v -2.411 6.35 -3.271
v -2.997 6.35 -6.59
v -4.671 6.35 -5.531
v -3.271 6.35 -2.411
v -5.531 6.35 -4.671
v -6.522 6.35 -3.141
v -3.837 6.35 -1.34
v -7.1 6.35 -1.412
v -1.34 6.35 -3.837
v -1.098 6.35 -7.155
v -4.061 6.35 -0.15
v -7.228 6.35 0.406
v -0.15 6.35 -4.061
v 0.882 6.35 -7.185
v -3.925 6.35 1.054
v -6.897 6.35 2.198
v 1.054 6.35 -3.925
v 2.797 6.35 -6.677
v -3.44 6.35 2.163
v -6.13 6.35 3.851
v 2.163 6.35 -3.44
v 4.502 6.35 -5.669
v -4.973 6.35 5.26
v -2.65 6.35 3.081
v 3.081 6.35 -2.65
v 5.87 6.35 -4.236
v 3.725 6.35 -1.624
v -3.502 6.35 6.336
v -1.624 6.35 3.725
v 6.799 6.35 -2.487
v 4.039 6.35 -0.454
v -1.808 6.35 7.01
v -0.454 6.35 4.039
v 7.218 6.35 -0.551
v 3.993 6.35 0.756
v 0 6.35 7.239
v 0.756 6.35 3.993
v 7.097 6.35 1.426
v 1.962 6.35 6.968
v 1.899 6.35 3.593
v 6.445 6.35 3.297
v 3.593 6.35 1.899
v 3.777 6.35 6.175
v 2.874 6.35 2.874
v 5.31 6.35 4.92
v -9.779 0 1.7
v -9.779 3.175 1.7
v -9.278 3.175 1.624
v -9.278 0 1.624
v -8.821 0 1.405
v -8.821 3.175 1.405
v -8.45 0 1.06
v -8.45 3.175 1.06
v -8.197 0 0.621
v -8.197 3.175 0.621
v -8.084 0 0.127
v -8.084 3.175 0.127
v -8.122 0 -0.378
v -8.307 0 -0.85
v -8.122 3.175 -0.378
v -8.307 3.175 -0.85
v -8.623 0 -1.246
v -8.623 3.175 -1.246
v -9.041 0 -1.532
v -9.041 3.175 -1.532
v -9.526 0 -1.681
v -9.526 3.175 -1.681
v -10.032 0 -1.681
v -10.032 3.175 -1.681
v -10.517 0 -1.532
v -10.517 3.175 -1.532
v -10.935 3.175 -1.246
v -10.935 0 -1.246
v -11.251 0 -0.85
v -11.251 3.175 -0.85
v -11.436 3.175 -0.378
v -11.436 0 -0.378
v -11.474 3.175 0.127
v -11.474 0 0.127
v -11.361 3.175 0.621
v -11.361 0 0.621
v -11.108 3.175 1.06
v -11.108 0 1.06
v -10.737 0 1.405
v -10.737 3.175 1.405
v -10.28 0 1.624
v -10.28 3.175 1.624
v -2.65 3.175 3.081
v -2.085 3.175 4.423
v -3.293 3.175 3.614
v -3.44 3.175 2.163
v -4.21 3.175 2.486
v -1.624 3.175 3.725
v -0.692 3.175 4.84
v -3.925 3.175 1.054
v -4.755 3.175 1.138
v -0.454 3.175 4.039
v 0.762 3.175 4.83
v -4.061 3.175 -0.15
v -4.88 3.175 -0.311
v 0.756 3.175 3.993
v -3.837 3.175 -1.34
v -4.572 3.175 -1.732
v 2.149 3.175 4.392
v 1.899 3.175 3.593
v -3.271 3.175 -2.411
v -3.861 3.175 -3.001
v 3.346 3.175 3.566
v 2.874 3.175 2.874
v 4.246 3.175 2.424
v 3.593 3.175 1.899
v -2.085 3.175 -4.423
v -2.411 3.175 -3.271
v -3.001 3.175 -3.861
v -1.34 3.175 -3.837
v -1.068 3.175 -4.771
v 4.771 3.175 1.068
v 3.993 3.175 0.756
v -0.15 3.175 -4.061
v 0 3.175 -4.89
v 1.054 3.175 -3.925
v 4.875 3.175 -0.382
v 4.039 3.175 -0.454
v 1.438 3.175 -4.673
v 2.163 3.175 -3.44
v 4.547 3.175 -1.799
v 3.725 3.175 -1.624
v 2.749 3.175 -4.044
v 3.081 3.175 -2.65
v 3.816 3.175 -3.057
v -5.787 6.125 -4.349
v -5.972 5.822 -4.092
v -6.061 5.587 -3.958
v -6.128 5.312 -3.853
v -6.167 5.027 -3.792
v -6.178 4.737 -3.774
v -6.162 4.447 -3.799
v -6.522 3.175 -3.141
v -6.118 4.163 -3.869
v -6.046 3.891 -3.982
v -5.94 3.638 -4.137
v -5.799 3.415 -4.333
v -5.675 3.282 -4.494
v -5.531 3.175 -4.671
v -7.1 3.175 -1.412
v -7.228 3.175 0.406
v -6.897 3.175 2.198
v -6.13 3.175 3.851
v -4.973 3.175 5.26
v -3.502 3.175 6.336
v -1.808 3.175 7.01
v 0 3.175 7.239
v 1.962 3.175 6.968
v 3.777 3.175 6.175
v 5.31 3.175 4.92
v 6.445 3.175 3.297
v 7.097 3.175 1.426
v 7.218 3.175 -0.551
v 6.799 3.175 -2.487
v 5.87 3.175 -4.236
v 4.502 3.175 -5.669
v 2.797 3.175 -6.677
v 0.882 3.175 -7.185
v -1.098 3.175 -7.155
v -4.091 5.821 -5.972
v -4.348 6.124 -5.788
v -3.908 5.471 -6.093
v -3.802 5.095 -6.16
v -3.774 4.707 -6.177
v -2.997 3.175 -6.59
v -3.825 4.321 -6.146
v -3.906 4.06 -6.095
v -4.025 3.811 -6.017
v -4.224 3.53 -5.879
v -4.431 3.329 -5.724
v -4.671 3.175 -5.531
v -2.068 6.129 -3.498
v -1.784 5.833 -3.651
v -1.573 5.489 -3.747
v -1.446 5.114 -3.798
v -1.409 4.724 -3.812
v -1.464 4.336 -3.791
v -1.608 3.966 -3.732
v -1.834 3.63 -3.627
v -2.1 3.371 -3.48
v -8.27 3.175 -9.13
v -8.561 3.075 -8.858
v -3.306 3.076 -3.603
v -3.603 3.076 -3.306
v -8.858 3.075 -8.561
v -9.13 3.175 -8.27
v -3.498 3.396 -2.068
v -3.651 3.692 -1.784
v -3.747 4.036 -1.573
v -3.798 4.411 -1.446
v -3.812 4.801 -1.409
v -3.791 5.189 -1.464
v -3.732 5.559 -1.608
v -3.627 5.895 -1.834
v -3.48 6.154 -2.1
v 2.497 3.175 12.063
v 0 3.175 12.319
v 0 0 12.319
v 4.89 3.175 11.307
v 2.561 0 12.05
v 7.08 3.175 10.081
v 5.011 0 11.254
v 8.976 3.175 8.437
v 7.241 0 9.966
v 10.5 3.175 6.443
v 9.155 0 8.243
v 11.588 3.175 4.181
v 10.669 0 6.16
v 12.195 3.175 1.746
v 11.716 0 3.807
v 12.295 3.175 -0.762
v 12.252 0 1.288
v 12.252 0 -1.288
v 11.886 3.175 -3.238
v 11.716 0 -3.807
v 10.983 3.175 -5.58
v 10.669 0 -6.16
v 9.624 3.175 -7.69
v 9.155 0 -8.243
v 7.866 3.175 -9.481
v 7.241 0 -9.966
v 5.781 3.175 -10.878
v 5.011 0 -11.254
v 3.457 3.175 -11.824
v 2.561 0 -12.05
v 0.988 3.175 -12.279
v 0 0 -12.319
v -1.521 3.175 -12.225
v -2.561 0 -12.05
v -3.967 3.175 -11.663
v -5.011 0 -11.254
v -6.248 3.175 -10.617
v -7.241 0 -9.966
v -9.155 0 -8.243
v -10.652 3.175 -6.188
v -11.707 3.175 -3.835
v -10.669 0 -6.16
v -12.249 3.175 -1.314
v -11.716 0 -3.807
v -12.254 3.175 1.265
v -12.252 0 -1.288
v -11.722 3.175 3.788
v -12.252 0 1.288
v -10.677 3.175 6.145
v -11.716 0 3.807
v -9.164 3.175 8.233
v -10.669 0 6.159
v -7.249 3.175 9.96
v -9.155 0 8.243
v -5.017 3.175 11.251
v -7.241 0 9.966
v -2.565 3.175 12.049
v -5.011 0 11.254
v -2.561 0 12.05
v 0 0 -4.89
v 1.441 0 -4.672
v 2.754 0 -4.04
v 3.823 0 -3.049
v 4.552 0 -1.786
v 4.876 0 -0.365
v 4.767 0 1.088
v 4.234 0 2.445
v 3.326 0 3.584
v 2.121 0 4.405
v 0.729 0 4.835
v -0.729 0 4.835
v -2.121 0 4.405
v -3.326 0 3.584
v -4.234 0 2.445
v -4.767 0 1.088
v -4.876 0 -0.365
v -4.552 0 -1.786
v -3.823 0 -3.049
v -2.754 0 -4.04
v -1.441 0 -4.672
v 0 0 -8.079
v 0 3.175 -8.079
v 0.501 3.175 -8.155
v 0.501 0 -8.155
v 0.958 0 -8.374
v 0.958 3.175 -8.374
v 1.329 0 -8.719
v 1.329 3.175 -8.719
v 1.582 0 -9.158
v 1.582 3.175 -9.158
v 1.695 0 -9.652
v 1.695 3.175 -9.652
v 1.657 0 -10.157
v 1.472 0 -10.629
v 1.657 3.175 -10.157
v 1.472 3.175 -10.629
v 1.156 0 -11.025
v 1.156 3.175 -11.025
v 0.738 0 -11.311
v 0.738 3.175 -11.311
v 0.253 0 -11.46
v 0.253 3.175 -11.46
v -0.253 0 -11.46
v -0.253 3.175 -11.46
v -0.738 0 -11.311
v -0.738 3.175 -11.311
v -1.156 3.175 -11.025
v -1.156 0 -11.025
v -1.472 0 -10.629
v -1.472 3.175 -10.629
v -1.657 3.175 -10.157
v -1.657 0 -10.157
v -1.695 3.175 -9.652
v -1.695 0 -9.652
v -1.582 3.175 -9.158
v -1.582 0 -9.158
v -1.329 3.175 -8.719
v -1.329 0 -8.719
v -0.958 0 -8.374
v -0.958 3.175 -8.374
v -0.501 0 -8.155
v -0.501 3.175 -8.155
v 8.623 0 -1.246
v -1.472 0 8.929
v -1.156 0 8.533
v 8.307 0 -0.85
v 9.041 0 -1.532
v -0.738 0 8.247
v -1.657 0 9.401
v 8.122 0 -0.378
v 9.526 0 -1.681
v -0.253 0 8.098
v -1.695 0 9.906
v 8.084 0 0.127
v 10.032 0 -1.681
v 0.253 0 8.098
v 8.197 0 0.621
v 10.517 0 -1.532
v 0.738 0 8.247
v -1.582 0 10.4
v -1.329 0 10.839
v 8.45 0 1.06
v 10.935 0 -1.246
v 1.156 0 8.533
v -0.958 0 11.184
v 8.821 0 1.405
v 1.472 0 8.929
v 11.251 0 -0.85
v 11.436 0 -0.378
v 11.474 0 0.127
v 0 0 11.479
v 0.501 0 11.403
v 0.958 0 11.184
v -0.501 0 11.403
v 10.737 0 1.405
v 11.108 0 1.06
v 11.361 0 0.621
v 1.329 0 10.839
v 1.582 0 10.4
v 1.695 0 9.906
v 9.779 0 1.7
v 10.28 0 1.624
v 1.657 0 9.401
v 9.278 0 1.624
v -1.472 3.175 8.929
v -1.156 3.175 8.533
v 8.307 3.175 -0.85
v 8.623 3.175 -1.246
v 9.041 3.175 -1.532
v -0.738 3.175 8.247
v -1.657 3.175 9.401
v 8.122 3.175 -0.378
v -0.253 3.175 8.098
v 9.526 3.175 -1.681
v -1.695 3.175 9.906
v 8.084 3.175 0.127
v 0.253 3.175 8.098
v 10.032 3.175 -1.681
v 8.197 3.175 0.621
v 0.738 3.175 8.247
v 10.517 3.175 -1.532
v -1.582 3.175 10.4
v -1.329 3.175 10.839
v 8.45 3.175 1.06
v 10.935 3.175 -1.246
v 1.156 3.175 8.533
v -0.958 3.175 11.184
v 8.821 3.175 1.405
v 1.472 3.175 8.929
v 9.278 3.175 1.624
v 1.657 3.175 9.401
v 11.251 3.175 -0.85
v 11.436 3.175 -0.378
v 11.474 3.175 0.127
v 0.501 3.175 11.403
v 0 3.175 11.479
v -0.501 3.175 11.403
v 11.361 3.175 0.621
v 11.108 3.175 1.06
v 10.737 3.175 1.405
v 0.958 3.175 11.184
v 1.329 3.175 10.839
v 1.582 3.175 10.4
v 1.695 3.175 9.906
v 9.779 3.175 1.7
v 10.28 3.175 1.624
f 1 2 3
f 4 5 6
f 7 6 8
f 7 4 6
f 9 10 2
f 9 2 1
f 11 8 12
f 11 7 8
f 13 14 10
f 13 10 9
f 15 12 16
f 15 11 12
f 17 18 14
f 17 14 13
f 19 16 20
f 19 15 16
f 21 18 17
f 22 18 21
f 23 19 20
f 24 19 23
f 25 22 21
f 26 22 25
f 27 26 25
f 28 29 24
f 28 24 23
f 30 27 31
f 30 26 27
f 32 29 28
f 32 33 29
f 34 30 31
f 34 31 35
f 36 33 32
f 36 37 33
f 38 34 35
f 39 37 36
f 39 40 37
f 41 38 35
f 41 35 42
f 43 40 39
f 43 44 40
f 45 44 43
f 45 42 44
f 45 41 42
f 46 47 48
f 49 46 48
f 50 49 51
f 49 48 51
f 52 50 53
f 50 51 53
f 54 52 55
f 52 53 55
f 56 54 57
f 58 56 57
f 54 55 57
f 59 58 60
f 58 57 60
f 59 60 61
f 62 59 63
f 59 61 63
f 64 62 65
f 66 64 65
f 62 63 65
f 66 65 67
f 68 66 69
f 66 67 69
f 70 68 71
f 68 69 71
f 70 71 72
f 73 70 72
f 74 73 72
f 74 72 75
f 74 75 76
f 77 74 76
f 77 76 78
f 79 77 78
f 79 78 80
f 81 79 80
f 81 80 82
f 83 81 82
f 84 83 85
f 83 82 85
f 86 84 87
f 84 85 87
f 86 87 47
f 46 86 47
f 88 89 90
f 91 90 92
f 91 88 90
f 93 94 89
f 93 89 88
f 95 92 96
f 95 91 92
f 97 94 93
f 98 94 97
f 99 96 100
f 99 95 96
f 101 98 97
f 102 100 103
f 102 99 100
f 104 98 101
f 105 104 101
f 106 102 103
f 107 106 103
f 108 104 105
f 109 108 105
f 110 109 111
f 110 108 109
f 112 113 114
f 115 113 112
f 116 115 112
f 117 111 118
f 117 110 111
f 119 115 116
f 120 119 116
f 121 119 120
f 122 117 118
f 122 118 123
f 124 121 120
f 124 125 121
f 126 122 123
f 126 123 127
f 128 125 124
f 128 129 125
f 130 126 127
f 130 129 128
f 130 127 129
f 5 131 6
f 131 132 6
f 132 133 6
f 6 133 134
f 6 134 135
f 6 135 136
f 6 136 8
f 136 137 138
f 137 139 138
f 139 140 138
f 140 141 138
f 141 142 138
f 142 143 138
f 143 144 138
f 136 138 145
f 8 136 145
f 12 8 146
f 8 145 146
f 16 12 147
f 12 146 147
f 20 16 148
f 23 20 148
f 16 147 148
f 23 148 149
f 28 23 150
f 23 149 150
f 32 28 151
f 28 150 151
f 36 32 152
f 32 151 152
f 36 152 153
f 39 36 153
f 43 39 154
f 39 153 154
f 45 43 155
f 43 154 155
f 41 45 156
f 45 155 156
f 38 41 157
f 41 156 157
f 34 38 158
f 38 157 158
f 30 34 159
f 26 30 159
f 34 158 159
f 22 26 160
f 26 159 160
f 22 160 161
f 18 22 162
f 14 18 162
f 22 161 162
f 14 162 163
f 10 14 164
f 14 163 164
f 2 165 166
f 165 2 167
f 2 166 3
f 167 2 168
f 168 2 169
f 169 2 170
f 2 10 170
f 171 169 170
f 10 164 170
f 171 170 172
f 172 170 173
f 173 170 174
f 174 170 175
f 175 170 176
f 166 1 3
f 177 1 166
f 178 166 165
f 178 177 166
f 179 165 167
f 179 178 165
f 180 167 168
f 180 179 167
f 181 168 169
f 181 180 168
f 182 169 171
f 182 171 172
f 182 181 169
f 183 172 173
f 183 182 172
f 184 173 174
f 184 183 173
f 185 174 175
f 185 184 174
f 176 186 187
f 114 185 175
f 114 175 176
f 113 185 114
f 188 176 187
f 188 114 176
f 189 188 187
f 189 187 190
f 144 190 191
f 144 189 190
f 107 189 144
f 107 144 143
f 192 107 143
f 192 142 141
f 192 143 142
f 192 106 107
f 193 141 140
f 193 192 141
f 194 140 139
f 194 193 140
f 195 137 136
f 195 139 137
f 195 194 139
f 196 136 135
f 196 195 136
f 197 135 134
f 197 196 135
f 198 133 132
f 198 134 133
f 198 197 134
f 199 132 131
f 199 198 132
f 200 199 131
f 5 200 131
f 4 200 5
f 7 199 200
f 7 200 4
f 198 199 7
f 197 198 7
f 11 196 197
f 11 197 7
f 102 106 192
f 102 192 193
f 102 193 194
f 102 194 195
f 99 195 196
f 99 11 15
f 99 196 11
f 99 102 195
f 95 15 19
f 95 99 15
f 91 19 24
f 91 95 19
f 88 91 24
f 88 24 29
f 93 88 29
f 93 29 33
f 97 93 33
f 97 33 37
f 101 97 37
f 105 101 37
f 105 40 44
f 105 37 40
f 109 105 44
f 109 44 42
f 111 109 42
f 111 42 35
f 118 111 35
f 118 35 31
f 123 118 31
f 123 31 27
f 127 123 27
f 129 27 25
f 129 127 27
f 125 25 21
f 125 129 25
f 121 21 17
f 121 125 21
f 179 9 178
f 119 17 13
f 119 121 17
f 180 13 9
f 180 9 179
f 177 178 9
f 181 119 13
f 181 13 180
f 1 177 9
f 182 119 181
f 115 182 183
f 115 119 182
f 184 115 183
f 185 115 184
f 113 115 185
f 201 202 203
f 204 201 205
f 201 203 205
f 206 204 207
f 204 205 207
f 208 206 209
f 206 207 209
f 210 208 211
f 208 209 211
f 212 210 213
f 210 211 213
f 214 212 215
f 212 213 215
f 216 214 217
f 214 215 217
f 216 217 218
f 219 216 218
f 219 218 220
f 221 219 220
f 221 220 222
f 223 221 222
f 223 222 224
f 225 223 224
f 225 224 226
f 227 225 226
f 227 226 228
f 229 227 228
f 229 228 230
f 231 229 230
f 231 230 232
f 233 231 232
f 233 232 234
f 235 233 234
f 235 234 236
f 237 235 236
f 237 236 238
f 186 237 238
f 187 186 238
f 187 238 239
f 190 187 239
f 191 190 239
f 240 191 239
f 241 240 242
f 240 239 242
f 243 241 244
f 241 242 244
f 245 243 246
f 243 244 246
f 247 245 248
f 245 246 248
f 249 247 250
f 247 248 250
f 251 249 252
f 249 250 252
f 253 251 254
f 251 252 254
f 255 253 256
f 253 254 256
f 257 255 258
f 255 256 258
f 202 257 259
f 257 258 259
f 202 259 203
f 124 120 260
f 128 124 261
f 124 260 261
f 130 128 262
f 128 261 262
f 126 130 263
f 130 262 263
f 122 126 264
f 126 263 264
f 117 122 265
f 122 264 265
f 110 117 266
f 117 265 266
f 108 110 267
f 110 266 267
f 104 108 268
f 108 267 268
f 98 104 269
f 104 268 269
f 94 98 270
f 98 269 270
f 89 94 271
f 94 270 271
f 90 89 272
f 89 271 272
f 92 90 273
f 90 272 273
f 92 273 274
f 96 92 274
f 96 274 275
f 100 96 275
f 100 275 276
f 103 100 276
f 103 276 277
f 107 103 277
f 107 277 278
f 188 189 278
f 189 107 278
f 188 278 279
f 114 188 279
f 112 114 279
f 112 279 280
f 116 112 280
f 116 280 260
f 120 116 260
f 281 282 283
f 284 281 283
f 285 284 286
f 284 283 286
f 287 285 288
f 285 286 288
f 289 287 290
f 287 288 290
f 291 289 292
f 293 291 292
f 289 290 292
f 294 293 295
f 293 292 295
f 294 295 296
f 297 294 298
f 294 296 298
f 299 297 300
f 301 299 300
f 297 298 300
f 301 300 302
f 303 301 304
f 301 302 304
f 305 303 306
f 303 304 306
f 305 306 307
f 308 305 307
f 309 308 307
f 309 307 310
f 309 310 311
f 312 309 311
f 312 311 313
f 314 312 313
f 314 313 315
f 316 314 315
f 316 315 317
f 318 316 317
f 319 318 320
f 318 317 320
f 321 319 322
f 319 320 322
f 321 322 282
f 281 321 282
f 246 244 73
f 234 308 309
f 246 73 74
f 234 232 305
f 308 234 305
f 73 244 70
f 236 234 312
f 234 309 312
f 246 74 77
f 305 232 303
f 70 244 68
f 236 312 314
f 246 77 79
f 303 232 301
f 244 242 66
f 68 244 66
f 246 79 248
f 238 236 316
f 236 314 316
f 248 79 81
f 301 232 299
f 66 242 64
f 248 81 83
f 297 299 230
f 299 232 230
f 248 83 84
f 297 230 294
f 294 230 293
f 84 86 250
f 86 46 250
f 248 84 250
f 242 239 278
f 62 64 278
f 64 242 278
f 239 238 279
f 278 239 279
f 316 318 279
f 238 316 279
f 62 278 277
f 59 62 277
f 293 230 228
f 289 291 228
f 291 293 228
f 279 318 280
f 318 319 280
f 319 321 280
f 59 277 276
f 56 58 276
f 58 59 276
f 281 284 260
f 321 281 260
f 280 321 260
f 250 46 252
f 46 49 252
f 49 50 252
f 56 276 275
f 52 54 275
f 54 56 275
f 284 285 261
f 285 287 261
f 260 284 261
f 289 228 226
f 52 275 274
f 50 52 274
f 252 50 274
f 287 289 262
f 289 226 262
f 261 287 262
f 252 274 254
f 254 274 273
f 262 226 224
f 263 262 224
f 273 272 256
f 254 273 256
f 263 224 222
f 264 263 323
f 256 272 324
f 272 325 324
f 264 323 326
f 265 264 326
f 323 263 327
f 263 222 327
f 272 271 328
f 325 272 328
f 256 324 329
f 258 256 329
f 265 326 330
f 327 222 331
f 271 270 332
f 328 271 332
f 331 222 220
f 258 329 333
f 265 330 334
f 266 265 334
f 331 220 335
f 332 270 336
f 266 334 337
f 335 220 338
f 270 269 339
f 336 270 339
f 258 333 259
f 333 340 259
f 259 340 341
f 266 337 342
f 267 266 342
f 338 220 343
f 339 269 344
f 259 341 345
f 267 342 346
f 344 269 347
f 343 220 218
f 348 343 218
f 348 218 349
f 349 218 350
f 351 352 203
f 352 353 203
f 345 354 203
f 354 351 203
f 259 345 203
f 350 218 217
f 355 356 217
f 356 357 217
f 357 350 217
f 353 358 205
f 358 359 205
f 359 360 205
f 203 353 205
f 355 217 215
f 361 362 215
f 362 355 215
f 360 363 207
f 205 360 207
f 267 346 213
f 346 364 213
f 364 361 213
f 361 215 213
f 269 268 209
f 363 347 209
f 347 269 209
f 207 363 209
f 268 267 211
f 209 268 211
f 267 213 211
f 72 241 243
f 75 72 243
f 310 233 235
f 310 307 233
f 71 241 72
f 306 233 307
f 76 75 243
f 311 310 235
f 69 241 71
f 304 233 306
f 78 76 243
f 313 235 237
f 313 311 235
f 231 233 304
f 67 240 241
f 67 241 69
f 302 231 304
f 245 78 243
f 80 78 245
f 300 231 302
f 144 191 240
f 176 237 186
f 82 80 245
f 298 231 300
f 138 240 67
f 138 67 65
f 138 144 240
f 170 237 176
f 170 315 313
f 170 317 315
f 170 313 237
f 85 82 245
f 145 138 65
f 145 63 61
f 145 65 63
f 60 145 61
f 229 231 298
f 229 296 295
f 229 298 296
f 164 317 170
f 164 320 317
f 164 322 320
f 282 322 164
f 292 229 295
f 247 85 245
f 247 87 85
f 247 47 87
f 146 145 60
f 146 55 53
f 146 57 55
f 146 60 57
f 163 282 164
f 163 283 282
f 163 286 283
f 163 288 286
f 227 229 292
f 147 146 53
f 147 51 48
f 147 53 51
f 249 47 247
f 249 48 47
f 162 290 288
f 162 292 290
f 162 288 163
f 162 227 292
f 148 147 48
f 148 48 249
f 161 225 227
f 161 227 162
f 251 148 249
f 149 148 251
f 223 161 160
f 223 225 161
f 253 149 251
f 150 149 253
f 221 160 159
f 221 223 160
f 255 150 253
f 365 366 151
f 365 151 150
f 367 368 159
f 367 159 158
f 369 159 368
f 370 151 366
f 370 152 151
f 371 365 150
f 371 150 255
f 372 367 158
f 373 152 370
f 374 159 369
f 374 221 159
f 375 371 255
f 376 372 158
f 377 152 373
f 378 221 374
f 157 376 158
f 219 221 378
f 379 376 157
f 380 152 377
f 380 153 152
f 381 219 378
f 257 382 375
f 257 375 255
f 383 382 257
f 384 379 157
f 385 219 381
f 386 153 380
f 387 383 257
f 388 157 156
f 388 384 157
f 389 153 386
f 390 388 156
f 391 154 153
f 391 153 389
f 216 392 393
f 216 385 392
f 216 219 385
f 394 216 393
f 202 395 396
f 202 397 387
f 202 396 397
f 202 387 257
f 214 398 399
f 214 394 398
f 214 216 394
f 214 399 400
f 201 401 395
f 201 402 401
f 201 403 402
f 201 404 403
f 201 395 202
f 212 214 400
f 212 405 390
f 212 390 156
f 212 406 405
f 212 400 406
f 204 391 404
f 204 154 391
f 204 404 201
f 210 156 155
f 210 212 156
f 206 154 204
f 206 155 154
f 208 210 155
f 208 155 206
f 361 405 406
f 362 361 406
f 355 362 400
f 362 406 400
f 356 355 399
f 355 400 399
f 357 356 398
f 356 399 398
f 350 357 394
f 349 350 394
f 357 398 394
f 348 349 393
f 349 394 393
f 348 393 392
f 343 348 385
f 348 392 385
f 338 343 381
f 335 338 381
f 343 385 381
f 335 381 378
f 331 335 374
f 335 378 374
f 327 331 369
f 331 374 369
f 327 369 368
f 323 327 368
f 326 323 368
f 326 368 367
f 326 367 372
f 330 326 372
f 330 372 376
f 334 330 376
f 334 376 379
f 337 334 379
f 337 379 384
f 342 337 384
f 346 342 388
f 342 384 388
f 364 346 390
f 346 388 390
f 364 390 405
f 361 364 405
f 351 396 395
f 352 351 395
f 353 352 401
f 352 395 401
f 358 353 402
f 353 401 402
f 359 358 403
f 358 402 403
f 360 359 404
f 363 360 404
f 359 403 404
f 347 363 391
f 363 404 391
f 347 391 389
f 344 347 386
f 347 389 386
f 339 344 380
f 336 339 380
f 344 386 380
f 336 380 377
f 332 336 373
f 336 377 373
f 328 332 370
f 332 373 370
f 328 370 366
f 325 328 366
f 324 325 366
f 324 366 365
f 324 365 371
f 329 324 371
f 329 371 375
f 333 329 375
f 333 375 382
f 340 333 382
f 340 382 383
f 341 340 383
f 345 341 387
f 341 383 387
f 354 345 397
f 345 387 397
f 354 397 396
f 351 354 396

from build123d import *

# Parameters (mm, degrees)
SKETCH1_R                      = 7.239
SKETCH1_R_2                    = 4.064
BOSS_EXTRUDE1_DEPTH            = 6.35
SKETCH1_3_R                    = 12.319
SKETCH1_3_R_2                  = 7.239
BOSS_EXTRUDE2_DEPTH            = 3.175
SKETCH2_R                      = 1.7
CUT_EXTRUDE1_DEPTH             = 3.175
SKETCH7_R                      = 4.8895
CUT_EXTRUDE3_DEPTH             = 3.175
CUT_EXTRUDE2_REACH             = 27.151
SKETCH5_R                      = 1.7
CUT_EXTRUDE2_DIRECTION_2_REACH = 27.151


with BuildPart() as part:
    # Sketch1 → Boss-Extrude1 (new body)
    with BuildSketch(Plane(origin=(0, 0, 0), x_dir=(1, 0, 0), z_dir=(0, 1, 0))):
        Circle(SKETCH1_R)
        Circle(SKETCH1_R_2, mode=Mode.SUBTRACT)
    extrude(amount=BOSS_EXTRUDE1_DEPTH)

    # Sketch1<3> → Boss-Extrude2 (add)
    with BuildSketch(Plane(origin=(0, 0, 0), x_dir=(1, 0, 0), z_dir=(0, 1, 0))):
        Circle(SKETCH1_3_R)
        Circle(SKETCH1_3_R_2, mode=Mode.SUBTRACT)
    extrude(amount=BOSS_EXTRUDE2_DEPTH)

    # Sketch2 → Cut-Extrude1 (cut)
    with BuildSketch(Plane(origin=(0, 3.175, 0), x_dir=(1, 0, 0), z_dir=(0, 1, 0))):
        with Locations((0, 9.779)):
            Circle(SKETCH2_R)
        with Locations((9.779, 0)):
            Circle(SKETCH2_R)
        with Locations((0, -9.779)):
            Circle(SKETCH2_R)
        with Locations((-9.779, 0)):
            Circle(SKETCH2_R)
    extrude(amount=-CUT_EXTRUDE1_DEPTH, mode=Mode.SUBTRACT)

    # Sketch7 → Cut-Extrude3 (cut)
    with BuildSketch(Plane.XZ):
        Circle(SKETCH7_R)
    extrude(amount=-CUT_EXTRUDE3_DEPTH, mode=Mode.SUBTRACT)

    # Sketch5 → Cut-Extrude2 (cut, up to next)
    with BuildSketch(Plane(origin=(-4.8895, 0, -4.8895), x_dir=(-0.7071067811865475, 0, 0.7071067811865477), z_dir=(-0.7071067811865477, 0, -0.7071067811865475)), mode=Mode.PRIVATE) as cut_extrude2_sk1:
        with Locations((0, 4.7625)):
            Circle(SKETCH5_R)
    cut_extrude2_tool1 = extrude(cut_extrude2_sk1.sketch, amount=-CUT_EXTRUDE2_REACH, mode=Mode.PRIVATE) & part.part
    add(cut_extrude2_tool1.solids().sort_by_distance((-4.8895, 4.7625, -4.8895))[0], mode=Mode.SUBTRACT)

    # Sketch5 → Cut-Extrude2 direction 2 (cut, up to next)
    with BuildSketch(Plane(origin=(-4.8895, 0, -4.8895), x_dir=(-0.7071067811865475, 0, 0.7071067811865477), z_dir=(-0.7071067811865477, 0, -0.7071067811865475)), mode=Mode.PRIVATE) as cut_extrude2_direction_2_sk1:
        with Locations((0, 4.7625)):
            Circle(SKETCH5_R)
    cut_extrude2_direction_2_tool1 = extrude(cut_extrude2_direction_2_sk1.sketch, amount=CUT_EXTRUDE2_DIRECTION_2_REACH, mode=Mode.PRIVATE) & part.part
    add(cut_extrude2_direction_2_tool1.solids().sort_by_distance((-4.8895, 4.7625, -4.8895))[0], mode=Mode.SUBTRACT)


solid = part.part
